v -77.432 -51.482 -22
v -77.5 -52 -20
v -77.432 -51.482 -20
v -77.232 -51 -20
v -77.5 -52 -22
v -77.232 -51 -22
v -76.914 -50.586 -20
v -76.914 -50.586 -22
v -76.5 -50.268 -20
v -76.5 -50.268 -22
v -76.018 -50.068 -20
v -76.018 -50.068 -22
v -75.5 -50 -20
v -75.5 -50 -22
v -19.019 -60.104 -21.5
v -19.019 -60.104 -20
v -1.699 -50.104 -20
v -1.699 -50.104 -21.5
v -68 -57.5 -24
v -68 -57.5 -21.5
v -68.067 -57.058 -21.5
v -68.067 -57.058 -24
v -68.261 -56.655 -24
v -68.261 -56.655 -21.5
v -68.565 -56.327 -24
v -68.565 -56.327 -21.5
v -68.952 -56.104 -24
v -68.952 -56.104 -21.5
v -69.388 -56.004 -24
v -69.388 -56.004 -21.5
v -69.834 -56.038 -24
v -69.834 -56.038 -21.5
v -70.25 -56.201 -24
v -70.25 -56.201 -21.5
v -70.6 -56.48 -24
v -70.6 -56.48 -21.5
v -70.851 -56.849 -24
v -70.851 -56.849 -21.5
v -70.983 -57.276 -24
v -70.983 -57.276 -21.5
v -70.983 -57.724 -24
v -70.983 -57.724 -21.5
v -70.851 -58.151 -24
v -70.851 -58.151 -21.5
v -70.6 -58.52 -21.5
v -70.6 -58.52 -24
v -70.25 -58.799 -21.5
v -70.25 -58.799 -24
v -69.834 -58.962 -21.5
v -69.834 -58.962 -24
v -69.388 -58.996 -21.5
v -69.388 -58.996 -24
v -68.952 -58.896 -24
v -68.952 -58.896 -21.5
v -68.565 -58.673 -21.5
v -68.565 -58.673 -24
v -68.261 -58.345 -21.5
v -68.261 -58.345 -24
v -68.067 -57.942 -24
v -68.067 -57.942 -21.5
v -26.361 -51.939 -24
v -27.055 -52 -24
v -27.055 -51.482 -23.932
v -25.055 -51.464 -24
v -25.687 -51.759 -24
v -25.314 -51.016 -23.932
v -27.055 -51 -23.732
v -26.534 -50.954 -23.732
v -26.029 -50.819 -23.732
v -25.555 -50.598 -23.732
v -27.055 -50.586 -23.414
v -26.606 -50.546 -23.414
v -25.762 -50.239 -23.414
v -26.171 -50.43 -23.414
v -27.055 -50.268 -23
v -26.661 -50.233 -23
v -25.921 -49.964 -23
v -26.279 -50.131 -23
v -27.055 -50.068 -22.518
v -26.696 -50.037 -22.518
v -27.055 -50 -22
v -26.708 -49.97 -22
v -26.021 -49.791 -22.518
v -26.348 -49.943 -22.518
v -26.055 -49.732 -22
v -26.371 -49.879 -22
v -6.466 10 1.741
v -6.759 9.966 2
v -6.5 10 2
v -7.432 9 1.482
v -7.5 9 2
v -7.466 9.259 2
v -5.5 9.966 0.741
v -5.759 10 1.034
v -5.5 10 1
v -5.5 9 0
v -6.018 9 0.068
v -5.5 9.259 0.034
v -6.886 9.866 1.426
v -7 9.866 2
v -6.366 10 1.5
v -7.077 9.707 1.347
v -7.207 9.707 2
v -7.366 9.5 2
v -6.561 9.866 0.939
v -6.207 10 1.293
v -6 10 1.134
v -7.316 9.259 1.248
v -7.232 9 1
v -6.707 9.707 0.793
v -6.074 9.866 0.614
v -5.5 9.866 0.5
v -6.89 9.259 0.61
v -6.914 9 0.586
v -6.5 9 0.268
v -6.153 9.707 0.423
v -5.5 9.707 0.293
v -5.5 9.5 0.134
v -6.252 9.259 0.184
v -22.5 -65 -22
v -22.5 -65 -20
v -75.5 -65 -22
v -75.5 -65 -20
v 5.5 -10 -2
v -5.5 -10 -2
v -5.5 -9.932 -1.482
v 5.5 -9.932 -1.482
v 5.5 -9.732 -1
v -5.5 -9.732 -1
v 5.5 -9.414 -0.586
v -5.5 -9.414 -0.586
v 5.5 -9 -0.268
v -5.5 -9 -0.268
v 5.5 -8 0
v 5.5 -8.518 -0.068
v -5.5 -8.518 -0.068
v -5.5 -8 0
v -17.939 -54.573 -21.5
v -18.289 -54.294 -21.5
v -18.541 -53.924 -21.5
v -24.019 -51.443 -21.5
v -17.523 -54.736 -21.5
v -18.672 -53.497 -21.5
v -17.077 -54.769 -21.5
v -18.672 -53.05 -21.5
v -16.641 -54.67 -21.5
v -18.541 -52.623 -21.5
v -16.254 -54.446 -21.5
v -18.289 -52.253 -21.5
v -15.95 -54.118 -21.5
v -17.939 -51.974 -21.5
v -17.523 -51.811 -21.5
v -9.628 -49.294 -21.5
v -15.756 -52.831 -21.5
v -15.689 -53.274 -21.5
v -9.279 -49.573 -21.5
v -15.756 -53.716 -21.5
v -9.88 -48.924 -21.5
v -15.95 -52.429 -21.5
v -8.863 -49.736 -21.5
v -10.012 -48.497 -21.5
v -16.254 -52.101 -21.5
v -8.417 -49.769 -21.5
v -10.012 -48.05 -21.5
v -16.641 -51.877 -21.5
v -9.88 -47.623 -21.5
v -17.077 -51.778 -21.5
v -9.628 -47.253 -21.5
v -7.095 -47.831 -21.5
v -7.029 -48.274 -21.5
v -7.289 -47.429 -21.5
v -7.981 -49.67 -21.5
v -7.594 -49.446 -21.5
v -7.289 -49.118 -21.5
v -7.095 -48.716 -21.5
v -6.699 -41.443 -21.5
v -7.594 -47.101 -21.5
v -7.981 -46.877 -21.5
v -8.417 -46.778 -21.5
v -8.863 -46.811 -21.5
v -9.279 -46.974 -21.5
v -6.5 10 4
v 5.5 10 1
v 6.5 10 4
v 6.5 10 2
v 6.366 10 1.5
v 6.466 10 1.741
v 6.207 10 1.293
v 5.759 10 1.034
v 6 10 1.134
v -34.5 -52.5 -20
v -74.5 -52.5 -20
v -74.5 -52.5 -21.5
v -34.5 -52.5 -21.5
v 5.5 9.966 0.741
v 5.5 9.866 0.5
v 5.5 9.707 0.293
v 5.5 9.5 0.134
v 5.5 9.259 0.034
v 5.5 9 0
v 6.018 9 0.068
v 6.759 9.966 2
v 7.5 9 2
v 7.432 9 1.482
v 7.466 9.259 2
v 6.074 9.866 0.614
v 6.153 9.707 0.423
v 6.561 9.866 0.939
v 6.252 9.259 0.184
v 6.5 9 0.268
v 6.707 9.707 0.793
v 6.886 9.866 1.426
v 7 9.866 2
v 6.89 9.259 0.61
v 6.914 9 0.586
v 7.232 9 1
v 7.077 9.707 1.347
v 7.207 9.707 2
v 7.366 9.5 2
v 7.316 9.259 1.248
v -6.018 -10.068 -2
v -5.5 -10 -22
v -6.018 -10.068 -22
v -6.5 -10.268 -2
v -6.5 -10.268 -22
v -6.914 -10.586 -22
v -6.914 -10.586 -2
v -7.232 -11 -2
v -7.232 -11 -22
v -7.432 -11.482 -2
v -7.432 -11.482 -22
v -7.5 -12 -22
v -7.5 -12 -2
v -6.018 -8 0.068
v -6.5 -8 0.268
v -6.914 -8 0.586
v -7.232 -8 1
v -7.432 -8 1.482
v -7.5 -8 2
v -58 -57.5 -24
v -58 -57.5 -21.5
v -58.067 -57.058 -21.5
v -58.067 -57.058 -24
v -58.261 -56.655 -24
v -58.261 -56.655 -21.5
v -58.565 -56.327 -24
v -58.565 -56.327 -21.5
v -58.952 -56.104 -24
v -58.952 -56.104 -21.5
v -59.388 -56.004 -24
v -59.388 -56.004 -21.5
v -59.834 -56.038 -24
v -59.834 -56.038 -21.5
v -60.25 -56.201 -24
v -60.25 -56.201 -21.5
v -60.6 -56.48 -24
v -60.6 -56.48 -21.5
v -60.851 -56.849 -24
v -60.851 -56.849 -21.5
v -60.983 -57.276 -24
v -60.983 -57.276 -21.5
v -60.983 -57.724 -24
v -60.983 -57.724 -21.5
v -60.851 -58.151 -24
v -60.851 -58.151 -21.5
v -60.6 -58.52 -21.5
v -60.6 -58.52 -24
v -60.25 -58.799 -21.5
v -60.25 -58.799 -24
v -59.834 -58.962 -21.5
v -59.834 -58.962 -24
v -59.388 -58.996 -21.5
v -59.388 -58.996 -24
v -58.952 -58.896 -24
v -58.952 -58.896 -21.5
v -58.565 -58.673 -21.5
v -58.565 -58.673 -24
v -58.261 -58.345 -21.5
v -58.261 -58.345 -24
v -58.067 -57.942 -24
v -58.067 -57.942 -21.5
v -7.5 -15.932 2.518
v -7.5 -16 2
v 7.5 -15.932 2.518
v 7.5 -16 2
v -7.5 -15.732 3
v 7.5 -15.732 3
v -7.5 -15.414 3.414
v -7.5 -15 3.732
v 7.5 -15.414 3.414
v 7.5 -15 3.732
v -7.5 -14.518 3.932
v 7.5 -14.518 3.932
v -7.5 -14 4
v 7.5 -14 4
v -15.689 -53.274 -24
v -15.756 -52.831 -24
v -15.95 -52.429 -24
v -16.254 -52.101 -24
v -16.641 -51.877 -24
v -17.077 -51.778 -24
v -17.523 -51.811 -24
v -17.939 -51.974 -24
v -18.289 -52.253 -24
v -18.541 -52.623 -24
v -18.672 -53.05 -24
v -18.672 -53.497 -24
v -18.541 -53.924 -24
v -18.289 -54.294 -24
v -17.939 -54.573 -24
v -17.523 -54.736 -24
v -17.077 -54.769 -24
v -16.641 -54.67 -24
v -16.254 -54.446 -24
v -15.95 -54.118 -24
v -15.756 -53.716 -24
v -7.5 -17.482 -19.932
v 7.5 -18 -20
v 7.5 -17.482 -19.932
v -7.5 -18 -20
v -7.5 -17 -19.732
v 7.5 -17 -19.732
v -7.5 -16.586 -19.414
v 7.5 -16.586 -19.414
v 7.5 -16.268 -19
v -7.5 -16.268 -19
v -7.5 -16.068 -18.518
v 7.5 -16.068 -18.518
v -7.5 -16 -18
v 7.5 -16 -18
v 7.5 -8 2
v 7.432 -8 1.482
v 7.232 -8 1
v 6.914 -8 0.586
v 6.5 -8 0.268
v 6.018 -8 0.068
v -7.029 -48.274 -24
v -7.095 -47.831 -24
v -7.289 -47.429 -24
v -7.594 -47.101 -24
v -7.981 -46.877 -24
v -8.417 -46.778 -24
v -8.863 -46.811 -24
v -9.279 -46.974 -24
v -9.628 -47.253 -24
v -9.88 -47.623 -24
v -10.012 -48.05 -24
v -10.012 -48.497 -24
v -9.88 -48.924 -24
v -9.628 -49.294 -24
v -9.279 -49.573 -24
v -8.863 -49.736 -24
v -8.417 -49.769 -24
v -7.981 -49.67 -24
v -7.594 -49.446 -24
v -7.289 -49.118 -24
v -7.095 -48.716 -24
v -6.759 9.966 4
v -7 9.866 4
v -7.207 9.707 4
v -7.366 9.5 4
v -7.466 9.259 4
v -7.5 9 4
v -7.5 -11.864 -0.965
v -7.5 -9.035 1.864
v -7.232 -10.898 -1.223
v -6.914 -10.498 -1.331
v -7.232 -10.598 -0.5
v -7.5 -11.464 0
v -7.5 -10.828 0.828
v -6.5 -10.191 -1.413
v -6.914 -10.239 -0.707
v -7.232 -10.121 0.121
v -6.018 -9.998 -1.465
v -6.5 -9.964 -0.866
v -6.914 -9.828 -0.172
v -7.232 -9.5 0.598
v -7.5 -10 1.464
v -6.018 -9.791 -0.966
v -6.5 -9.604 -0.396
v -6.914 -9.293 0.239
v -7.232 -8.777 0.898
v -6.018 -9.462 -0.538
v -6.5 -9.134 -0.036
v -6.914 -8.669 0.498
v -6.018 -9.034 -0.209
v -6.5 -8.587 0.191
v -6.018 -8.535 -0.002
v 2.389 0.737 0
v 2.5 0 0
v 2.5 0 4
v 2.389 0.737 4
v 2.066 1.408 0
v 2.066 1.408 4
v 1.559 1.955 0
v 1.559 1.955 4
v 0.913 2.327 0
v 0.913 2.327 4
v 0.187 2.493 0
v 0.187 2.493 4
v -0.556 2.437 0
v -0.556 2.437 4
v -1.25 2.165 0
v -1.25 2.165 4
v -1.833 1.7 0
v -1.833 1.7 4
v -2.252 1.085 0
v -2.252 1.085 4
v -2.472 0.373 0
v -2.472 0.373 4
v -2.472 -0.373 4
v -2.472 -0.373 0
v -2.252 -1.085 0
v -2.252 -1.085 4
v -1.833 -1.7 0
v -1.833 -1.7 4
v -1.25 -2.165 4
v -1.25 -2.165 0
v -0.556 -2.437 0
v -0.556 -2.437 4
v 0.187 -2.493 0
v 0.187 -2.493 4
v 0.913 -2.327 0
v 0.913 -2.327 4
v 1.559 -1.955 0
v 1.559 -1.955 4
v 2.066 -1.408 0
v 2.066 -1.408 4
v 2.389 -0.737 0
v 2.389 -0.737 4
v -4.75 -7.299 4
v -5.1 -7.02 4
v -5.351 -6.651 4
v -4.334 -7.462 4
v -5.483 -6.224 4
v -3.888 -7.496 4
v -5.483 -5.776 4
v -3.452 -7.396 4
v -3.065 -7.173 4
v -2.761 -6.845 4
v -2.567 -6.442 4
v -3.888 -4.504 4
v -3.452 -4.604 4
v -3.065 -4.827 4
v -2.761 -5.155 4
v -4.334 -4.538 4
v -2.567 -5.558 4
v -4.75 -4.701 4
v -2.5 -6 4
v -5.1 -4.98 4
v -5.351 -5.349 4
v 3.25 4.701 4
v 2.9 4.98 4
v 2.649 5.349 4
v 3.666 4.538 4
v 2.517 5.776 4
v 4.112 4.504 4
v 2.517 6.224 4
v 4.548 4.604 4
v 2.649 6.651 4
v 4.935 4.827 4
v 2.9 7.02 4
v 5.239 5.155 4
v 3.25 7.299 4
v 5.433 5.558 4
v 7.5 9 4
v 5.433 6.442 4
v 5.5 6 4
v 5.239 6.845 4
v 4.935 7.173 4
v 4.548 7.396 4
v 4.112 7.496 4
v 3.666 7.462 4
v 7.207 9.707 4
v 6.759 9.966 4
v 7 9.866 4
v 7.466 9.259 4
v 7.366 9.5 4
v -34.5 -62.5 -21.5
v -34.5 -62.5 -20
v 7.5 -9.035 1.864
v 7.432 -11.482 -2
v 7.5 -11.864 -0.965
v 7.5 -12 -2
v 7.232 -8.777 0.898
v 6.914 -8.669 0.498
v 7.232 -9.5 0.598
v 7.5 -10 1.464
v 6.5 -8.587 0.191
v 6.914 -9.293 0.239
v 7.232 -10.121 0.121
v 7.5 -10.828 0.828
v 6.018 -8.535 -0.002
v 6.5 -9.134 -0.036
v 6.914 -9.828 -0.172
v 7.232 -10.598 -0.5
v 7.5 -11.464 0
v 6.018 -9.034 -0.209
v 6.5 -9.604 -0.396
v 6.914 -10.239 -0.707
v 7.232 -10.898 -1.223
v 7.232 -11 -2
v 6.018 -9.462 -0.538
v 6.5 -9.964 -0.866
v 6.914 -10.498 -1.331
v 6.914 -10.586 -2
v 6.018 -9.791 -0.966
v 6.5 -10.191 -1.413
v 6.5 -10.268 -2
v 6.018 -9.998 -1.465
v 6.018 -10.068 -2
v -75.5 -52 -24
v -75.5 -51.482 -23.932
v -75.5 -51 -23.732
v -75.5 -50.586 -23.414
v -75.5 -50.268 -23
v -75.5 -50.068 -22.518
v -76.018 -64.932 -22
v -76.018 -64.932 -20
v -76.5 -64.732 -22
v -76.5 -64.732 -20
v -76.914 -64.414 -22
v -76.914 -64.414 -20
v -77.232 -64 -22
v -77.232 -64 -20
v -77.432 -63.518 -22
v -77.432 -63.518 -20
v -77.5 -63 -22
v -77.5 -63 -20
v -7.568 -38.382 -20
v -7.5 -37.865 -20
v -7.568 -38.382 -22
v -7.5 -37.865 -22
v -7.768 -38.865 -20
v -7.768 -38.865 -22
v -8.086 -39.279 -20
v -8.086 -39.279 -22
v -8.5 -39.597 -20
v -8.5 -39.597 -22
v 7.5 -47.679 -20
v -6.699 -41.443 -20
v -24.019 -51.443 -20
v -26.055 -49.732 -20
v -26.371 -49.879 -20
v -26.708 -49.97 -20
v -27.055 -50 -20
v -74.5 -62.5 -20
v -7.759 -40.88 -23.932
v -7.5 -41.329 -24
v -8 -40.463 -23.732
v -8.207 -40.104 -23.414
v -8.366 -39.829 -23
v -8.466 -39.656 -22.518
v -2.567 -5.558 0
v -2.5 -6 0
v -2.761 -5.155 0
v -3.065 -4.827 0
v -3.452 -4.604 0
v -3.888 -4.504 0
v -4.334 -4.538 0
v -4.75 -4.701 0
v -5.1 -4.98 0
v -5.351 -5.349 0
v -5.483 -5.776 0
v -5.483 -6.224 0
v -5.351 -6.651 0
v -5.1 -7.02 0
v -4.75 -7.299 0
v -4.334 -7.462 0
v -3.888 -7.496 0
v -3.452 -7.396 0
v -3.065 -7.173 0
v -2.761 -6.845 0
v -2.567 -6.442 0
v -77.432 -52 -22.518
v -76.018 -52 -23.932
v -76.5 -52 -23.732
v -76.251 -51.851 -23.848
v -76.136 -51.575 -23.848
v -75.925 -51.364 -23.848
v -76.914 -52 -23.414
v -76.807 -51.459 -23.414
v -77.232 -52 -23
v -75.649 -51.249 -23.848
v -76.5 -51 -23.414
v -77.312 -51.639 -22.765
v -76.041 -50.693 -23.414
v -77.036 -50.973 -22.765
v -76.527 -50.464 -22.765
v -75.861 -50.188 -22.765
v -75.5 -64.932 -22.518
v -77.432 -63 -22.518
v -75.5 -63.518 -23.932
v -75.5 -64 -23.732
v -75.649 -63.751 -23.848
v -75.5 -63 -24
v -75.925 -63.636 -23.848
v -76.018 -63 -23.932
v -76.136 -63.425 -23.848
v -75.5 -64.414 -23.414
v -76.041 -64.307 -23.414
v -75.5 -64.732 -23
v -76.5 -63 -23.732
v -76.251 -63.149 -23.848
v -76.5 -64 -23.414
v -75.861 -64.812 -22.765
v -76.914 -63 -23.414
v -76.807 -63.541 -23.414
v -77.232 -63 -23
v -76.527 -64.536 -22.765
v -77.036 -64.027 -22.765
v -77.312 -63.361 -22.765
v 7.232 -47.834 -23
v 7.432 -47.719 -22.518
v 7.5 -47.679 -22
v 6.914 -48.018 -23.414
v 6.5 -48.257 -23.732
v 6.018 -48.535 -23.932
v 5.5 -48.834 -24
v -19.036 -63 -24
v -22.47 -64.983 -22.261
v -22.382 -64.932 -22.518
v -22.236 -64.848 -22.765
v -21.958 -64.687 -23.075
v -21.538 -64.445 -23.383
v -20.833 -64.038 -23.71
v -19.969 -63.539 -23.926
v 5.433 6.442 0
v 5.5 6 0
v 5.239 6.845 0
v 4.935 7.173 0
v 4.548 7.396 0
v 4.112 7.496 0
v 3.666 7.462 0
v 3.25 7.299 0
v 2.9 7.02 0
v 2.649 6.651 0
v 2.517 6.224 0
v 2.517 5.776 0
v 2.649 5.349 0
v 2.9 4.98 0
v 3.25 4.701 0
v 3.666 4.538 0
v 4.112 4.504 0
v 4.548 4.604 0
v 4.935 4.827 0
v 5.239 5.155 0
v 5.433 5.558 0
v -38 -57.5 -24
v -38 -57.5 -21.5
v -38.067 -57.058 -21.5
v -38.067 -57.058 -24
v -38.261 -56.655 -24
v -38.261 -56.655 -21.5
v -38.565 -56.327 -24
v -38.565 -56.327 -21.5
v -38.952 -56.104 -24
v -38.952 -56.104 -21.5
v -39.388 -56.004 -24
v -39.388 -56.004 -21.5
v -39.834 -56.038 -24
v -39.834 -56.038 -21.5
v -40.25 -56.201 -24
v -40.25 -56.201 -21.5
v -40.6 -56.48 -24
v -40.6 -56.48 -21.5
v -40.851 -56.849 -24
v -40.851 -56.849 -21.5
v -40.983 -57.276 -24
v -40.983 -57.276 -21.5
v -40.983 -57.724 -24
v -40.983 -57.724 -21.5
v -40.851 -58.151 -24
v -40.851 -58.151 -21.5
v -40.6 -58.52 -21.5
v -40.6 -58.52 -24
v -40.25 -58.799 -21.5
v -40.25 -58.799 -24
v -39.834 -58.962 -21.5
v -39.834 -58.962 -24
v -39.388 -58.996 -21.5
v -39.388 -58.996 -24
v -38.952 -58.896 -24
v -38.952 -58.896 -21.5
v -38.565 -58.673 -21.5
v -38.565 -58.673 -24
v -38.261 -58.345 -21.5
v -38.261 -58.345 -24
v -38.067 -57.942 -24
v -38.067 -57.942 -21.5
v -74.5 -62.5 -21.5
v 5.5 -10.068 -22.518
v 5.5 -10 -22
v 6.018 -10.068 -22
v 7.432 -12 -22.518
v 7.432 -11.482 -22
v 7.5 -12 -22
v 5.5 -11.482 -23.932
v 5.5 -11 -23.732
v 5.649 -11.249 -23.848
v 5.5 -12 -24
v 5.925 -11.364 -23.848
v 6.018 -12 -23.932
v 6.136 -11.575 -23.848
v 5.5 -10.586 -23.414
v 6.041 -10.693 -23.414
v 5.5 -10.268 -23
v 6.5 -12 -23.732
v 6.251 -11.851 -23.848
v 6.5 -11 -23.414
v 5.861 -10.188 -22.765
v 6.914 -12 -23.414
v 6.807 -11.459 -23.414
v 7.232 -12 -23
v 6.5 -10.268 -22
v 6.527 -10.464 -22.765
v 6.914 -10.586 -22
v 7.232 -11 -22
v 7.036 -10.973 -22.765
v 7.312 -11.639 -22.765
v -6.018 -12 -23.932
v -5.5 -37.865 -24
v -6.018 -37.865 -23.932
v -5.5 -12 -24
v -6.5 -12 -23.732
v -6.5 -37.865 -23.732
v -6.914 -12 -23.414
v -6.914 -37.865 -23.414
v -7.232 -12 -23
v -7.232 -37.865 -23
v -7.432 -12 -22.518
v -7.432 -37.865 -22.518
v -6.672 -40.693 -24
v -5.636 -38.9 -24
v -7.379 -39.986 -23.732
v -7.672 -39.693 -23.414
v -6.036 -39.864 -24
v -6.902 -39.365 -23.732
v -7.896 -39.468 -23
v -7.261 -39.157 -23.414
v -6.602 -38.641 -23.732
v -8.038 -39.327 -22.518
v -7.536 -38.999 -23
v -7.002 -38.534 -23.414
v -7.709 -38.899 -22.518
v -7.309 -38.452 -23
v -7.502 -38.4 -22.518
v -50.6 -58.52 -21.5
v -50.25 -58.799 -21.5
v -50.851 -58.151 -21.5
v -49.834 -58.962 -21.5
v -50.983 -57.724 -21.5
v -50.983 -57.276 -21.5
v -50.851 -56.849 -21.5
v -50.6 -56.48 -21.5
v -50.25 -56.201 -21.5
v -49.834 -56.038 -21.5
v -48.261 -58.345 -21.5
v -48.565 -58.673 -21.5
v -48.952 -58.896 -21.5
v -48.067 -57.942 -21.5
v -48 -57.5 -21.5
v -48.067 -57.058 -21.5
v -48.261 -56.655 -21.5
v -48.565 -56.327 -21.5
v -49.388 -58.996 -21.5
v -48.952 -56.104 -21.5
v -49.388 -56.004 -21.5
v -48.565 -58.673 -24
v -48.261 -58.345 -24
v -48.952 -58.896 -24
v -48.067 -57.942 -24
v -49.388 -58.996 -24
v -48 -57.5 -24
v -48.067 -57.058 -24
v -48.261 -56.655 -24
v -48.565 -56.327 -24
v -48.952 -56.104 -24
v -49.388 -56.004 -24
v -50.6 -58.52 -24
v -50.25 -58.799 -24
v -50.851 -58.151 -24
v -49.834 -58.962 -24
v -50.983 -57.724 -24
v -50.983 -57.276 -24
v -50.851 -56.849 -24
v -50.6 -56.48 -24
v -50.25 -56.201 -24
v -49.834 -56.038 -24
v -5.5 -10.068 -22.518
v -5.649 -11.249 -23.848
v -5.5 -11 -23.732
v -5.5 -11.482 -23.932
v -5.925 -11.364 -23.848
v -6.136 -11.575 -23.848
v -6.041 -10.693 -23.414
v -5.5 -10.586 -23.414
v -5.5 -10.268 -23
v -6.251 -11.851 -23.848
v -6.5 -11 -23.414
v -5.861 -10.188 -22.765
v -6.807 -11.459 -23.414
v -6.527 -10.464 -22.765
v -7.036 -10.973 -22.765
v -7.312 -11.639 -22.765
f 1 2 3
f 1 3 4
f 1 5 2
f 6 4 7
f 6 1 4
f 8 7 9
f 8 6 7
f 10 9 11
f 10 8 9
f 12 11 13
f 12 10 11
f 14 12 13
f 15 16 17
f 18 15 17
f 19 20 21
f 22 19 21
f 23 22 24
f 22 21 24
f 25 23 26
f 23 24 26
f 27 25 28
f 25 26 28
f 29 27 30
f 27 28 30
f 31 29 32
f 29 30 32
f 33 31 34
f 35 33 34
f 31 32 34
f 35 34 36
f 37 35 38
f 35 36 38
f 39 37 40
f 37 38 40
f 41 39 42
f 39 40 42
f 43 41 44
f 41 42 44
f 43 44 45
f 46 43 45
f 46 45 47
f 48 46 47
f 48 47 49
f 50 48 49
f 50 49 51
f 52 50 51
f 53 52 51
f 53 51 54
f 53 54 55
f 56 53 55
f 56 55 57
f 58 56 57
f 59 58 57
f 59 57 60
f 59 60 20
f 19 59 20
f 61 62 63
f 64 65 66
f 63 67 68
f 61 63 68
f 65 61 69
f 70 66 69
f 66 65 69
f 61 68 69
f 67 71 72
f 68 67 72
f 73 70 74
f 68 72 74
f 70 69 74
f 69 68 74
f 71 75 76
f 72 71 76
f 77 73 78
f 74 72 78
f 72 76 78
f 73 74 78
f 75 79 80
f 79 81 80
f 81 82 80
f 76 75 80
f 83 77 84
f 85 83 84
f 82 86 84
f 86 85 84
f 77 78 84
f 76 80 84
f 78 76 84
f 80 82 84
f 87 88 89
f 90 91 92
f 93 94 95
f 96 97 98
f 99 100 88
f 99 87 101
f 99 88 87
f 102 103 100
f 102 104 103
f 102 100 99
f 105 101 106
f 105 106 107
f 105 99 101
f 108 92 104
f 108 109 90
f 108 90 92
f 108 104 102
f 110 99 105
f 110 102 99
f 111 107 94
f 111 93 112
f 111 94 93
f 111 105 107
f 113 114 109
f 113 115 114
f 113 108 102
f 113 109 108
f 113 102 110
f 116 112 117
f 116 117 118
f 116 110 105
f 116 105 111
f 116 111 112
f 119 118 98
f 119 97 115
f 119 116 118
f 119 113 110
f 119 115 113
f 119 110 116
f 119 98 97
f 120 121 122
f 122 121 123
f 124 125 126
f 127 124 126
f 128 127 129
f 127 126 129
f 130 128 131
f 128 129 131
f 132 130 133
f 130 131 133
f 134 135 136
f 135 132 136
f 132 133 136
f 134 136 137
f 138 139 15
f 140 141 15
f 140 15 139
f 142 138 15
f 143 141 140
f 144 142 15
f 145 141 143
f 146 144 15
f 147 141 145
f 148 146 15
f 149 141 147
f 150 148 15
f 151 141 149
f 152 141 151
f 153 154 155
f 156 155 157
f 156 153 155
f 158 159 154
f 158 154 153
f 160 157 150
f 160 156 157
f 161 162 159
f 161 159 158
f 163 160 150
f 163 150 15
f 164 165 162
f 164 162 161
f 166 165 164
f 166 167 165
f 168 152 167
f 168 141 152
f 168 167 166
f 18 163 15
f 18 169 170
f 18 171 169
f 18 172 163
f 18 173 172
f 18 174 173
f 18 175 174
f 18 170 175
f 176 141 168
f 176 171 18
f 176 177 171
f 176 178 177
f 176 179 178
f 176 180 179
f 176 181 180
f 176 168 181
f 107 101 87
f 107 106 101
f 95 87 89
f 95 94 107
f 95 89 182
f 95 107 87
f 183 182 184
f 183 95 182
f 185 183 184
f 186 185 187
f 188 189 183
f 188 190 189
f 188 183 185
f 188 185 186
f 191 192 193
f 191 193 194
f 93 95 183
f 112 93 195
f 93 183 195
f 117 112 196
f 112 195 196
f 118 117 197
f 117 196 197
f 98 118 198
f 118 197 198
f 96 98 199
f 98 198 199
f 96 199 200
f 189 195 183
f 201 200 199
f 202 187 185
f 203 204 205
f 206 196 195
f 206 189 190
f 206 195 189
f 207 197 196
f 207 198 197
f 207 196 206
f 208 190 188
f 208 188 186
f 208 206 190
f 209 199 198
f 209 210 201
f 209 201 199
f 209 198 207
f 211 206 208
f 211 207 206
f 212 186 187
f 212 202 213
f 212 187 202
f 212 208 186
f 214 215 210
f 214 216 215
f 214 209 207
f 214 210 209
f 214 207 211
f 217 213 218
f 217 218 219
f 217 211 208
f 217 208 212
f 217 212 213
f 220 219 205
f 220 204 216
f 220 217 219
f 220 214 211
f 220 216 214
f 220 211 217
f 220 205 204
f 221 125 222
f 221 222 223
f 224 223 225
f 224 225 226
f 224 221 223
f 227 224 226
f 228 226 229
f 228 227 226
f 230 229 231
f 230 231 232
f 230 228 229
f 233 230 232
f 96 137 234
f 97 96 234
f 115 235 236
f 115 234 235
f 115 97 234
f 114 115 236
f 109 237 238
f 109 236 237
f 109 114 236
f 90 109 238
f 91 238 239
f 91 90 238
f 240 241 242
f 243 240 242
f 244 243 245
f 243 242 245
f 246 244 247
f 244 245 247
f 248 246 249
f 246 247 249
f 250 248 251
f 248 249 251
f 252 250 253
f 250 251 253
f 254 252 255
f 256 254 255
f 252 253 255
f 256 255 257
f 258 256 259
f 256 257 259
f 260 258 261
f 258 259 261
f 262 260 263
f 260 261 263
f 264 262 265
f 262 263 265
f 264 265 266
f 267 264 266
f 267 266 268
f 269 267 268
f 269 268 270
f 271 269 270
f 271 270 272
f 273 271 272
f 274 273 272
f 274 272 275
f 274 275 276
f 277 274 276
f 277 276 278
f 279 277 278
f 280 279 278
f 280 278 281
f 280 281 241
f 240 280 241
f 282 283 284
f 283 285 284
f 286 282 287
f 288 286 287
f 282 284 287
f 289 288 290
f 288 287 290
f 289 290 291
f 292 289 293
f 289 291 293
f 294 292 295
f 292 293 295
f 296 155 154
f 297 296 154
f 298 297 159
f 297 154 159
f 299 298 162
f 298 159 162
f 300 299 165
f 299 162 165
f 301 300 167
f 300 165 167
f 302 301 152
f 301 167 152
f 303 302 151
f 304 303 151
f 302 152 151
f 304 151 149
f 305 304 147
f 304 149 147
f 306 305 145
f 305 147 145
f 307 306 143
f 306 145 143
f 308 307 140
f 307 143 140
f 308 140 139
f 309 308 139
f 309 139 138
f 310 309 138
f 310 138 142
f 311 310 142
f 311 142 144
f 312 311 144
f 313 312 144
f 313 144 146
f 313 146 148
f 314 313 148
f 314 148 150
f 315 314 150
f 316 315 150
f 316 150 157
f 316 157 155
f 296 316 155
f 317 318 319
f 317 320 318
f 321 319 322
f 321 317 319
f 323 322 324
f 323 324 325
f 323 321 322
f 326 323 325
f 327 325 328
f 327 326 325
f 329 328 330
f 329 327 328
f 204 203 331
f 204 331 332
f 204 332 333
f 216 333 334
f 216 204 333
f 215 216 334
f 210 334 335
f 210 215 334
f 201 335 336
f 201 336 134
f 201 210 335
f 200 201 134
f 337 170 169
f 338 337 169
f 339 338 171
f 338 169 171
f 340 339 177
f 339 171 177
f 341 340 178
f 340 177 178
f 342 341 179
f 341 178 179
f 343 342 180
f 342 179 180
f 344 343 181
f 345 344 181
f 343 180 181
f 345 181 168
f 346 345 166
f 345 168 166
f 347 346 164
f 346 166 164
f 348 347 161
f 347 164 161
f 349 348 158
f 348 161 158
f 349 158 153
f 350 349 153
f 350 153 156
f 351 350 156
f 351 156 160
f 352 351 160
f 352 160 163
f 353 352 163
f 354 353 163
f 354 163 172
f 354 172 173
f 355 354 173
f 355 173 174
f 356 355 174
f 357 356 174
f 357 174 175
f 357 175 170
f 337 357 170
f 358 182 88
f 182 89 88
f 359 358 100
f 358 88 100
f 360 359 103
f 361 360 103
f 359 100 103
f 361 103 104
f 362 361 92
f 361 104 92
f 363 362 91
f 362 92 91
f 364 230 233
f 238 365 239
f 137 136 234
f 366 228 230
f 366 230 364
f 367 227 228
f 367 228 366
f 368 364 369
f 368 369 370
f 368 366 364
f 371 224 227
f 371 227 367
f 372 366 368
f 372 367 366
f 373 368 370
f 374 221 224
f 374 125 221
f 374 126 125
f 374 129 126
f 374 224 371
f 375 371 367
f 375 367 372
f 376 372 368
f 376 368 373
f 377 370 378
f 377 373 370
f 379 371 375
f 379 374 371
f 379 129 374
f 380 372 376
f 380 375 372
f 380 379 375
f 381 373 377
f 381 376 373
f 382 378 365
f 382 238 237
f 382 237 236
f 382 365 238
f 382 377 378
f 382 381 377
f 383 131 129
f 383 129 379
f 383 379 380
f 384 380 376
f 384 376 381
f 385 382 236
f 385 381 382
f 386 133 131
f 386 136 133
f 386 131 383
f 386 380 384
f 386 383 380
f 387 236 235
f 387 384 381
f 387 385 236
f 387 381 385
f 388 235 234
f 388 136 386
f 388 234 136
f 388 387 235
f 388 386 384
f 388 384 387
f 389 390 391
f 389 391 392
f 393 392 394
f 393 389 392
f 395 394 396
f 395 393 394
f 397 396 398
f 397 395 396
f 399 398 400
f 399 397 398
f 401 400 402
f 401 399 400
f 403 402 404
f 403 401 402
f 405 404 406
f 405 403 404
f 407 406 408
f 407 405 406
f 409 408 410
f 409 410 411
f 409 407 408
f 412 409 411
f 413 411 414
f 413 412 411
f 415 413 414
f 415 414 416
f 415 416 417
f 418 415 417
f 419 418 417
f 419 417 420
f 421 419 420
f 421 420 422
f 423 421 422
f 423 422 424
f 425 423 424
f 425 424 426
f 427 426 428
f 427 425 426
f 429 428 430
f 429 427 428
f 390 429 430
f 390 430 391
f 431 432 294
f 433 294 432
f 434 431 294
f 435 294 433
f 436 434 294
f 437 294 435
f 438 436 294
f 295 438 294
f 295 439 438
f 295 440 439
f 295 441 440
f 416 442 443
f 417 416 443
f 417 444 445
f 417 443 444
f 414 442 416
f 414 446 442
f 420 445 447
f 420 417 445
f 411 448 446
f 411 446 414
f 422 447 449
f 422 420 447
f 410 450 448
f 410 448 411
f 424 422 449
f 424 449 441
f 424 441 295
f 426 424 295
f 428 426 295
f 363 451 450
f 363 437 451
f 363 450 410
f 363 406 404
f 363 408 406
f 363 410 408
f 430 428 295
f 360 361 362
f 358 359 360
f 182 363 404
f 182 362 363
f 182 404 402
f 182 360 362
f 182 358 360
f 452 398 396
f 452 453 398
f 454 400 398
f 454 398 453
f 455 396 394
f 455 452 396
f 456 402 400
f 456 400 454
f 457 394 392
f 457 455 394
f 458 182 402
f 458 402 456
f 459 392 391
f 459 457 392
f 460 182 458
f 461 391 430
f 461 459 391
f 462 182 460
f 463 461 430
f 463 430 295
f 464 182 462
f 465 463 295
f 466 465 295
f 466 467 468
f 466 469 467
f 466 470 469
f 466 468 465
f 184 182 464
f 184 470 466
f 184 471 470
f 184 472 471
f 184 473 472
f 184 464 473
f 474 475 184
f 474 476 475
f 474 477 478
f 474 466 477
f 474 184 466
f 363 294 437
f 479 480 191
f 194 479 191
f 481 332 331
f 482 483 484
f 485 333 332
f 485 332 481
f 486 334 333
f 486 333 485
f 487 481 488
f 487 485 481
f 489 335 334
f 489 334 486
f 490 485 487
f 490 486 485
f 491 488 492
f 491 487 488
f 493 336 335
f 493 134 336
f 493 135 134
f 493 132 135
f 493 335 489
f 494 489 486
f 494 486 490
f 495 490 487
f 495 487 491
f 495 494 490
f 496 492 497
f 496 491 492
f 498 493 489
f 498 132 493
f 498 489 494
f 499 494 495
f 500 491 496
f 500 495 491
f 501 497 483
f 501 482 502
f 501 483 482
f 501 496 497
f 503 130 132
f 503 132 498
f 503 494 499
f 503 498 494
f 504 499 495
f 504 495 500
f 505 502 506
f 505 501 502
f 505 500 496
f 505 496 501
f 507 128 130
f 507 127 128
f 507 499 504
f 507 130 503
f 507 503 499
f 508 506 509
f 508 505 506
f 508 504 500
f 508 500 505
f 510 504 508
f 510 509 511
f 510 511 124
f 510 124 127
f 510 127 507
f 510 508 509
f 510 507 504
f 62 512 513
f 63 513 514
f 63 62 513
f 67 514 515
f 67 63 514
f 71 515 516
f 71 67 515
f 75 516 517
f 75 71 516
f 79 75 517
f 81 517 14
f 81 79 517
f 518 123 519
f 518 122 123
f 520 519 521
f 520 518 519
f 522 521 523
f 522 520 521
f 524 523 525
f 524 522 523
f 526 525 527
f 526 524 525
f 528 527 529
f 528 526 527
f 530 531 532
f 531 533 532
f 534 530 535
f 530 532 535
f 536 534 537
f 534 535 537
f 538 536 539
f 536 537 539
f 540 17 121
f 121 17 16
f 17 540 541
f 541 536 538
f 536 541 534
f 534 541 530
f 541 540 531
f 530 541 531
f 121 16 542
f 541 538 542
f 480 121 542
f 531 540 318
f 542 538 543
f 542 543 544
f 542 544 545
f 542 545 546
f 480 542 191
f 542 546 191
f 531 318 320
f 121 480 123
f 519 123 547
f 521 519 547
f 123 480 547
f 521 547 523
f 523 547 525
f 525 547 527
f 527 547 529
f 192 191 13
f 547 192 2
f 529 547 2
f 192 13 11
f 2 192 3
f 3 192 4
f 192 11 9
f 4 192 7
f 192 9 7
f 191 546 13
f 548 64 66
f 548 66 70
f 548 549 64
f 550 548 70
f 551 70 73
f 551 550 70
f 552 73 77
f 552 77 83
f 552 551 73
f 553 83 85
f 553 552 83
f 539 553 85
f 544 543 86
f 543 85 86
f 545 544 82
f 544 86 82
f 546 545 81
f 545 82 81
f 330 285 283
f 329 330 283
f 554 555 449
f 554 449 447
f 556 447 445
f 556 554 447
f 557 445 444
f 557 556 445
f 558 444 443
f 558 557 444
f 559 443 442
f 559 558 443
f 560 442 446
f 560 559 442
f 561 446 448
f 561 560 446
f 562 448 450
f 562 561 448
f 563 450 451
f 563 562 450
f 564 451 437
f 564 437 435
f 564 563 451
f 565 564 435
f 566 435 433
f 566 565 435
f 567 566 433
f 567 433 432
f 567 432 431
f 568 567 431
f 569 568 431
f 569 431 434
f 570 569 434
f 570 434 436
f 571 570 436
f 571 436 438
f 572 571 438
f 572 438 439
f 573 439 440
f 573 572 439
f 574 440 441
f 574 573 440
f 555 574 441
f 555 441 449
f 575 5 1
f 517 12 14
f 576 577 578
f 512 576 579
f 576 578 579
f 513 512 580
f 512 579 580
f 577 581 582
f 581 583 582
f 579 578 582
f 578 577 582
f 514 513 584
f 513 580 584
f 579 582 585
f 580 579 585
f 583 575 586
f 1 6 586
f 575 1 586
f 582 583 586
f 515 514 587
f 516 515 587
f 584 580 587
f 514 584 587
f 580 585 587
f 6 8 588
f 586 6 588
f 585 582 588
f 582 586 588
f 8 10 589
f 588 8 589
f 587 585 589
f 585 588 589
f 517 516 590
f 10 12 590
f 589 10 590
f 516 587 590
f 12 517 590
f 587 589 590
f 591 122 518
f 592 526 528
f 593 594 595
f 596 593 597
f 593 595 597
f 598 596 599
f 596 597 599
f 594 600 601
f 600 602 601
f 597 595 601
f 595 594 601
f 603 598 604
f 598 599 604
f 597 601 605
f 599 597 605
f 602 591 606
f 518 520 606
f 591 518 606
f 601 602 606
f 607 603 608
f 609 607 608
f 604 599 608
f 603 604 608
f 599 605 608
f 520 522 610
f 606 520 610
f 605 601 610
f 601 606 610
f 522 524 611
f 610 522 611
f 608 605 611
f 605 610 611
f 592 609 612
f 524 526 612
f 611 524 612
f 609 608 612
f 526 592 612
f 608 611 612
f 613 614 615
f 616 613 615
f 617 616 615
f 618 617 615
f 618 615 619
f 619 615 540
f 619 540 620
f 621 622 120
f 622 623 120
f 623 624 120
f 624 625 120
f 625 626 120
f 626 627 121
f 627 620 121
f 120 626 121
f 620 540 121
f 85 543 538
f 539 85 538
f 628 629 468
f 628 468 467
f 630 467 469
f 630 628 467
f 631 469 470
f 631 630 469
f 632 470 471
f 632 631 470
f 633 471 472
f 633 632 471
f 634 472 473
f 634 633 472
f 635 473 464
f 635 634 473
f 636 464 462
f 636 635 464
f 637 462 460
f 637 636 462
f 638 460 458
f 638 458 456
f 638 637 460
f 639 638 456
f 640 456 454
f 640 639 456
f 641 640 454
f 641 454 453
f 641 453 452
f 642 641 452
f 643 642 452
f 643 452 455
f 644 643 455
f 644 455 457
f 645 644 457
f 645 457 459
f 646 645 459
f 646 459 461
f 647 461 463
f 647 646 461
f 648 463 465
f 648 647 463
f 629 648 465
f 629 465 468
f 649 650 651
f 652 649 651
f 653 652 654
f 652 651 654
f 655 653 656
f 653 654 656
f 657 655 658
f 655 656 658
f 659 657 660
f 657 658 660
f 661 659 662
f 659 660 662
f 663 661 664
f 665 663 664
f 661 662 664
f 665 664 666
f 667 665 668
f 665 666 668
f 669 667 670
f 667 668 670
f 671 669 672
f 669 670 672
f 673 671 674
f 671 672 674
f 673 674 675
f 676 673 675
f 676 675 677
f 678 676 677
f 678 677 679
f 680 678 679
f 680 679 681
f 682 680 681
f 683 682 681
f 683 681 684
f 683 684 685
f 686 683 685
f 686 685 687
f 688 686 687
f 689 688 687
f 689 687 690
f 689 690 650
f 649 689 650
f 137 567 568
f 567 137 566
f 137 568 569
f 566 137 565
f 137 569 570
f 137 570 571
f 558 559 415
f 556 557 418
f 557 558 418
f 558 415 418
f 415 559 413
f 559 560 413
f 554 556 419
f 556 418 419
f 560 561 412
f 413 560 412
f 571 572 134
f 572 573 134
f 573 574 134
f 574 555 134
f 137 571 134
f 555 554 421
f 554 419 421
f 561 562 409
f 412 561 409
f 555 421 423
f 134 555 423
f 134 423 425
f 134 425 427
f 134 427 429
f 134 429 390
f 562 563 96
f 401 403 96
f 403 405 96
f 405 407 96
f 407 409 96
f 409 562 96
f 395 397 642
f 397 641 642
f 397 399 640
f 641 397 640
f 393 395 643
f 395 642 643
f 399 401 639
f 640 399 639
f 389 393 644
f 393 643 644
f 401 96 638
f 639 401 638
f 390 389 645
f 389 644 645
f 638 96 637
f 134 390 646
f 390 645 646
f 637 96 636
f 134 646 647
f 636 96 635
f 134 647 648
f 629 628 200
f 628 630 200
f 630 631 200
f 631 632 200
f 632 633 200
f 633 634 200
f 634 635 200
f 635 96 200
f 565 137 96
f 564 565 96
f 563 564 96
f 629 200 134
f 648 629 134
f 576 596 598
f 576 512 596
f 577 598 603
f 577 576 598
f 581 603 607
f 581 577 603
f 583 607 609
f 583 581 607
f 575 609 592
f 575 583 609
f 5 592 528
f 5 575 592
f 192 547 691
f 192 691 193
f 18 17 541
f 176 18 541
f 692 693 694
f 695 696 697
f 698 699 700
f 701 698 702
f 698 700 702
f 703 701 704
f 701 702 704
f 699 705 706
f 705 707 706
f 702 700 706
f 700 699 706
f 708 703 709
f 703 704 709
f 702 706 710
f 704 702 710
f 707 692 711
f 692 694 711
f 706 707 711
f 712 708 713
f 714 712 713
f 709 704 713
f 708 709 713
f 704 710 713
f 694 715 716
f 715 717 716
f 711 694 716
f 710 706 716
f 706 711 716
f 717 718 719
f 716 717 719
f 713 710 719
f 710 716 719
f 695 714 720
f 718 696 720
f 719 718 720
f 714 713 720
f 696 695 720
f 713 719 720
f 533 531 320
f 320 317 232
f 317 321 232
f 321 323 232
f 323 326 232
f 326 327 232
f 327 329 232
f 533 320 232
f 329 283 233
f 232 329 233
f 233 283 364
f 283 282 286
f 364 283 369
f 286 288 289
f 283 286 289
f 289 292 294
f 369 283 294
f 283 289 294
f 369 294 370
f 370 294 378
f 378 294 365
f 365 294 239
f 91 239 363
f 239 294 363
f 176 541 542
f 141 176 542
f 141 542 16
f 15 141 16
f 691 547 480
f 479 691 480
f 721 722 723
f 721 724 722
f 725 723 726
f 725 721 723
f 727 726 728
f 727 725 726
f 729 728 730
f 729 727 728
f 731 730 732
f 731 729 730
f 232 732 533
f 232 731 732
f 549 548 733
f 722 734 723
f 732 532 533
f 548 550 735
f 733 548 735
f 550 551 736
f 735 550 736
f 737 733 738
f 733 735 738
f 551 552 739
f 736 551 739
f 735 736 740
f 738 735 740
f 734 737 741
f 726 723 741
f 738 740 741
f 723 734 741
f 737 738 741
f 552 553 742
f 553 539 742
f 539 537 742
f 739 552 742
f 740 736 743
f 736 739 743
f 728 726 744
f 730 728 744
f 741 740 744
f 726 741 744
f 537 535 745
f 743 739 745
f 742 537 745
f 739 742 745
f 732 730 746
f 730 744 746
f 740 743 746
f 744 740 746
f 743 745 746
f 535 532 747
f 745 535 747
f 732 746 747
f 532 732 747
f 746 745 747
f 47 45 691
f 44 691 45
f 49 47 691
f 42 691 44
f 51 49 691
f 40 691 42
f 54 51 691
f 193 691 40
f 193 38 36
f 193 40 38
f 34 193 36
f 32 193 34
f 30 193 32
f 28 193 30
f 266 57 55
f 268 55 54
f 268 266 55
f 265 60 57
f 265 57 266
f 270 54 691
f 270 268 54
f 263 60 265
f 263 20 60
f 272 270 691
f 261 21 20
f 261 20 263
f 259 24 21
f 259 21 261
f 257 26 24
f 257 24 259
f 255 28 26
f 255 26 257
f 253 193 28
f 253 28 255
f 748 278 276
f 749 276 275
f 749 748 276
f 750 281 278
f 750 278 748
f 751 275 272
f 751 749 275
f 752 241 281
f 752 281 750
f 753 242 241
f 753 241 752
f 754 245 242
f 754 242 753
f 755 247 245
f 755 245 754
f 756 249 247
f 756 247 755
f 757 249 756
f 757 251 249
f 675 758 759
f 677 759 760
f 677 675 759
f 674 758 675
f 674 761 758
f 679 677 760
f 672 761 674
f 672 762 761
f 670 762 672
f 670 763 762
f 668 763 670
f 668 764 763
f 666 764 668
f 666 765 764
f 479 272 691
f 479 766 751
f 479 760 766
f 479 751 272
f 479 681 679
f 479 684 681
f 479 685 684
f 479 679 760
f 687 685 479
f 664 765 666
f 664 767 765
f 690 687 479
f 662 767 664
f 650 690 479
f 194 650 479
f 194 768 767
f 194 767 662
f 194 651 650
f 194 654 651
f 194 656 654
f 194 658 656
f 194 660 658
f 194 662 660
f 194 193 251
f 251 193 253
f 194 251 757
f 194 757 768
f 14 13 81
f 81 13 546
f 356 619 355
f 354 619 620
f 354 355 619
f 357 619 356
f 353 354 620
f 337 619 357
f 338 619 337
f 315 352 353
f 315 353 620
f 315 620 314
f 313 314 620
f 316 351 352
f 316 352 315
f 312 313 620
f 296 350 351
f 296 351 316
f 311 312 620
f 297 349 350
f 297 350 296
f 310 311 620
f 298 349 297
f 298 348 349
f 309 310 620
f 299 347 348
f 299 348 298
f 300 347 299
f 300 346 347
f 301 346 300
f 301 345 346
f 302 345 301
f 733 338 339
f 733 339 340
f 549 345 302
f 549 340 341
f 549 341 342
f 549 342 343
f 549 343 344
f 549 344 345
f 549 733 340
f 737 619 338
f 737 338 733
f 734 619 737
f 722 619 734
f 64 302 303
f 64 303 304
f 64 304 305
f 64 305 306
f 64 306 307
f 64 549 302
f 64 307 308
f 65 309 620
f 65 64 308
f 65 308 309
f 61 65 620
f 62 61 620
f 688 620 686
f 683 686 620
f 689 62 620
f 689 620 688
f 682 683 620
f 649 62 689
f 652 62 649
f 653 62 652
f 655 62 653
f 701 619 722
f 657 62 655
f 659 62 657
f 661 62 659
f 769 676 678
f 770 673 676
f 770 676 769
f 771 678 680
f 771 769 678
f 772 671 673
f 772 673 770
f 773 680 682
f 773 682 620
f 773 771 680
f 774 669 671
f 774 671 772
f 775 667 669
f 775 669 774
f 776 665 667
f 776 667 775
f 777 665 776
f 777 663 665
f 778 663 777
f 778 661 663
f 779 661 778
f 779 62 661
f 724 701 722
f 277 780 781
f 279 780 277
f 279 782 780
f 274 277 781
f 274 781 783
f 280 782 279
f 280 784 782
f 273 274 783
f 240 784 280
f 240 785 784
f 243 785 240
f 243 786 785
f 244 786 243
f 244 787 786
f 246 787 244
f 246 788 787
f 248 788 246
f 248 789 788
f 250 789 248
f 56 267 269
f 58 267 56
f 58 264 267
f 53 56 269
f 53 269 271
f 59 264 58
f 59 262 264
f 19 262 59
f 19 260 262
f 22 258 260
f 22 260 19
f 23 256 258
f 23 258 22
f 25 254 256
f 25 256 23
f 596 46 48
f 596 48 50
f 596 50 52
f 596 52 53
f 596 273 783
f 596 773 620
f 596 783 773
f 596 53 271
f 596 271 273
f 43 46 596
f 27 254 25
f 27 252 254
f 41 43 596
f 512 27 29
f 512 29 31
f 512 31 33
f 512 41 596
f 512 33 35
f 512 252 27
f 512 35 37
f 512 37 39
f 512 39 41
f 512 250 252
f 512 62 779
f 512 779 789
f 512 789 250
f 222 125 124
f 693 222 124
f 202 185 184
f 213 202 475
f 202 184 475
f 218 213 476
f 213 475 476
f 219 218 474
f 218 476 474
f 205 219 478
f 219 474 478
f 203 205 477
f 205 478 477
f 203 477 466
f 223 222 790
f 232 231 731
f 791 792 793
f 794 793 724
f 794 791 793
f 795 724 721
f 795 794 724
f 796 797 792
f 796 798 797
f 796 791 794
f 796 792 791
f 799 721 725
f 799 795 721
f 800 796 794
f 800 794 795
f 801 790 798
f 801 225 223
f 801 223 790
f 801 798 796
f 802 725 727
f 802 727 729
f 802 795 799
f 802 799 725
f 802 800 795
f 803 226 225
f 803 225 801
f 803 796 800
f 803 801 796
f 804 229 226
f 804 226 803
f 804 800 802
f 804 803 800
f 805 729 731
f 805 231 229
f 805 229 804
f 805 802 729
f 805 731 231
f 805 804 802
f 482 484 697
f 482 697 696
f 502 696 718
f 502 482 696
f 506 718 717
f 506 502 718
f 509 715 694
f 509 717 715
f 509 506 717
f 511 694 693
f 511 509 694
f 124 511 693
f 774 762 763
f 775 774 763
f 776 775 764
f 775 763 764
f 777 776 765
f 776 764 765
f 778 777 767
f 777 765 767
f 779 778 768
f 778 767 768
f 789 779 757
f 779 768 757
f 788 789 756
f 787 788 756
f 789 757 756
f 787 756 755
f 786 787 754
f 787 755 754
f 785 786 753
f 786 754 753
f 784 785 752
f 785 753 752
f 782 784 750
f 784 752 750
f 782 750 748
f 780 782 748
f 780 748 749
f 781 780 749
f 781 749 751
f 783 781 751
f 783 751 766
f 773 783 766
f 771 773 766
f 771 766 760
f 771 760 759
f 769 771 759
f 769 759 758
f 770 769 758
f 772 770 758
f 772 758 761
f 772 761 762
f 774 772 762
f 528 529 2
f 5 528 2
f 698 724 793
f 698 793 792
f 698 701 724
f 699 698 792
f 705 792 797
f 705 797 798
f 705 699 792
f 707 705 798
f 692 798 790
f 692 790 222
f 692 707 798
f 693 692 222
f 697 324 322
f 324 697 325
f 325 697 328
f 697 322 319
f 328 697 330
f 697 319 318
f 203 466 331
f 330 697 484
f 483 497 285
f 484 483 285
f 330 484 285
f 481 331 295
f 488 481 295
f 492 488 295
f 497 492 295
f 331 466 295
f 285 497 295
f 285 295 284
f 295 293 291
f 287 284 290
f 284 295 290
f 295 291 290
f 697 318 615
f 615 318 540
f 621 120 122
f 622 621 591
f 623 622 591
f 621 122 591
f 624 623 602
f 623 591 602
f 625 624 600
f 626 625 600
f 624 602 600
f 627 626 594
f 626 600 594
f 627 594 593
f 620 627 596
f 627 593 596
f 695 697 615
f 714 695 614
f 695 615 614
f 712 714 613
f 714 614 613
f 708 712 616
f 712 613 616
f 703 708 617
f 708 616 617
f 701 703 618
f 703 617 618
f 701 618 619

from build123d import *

# Parameters (mm, degrees)
SKETCH_1_W          = 15
SKETCH_1_H          = 26
SKETCH_1_R          = 2.5
SKETCH_1_R_2        = 1.5
EXTRUDE_1_DEPTH     = 4
SKETCH_3_W          = 15
SKETCH_3_H          = 6
EXTRUDE_2_DEPTH     = 20
EXTRUDE_3_DEPTH     = 4
SKETCH_9_W          = 40
SKETCH_9_H          = 10
CUT_EXTRUDE_1_DEPTH = 1.5
SKETCH_10_R         = 1.5
CUT_EXTRUDE_2_DEPTH = 4
CUT_EXTRUDE_3_DEPTH = 1.5
SKETCH_12_R         = 1.5
CUT_EXTRUDE_4_DEPTH = 10
FILLET_1_R          = 2
FILLET_2_R          = 2
FILLET_3_R          = 1


with BuildPart() as part:
    # 草图1 → 凸台-拉伸1 (new body)
    with BuildSketch(Plane.XY):
        with Locations((0, -3)):
            Rectangle(SKETCH_1_W, SKETCH_1_H)
        Circle(SKETCH_1_R, mode=Mode.SUBTRACT)
        with Locations((4, 6)):
            Circle(SKETCH_1_R_2, mode=Mode.SUBTRACT)
        with Locations((-4, -6)):
            Circle(SKETCH_1_R_2, mode=Mode.SUBTRACT)
    extrude(amount=EXTRUDE_1_DEPTH)

    # 草图3 → 凸台-拉伸2 (add)
    with BuildSketch(Plane(origin=(0, 0, 0), x_dir=(-1, 0, 0), z_dir=(0, 0, -1))):
        with Locations((0, -13)):
            Rectangle(SKETCH_3_W, SKETCH_3_H)
    extrude(amount=EXTRUDE_2_DEPTH)

    # 草图8 → 凸台-拉伸3 (add)
    with BuildSketch(Plane(origin=(0, 0, -20), x_dir=(-1, 0, 0), z_dir=(0, 0, -1))):
        Polygon((-7.5, -16), (-7.5, -47.679491924), (22.5, -65), (77.5, -65), (77.5, -50), (26.519237886, -50), (7.5, -39.019237886), (7.5, -16), (7.5, -10), (-7.5, -10), align=None)
    extrude(amount=EXTRUDE_3_DEPTH)

    # 草图9 → 切除-拉伸1 (cut)
    with BuildSketch(Plane.XY.offset(-20)):
        with Locations((-54.5, -57.5)):
            Rectangle(SKETCH_9_W, SKETCH_9_H)
    extrude(amount=-CUT_EXTRUDE_1_DEPTH, mode=Mode.SUBTRACT)

    # 草图10 → 切除-拉伸2 (cut)
    with BuildSketch(Plane.XY.offset(-21.5)):
        with Locations((-69.5, -57.5)):
            Circle(SKETCH_10_R)
        with Locations((-59.5, -57.5)):
            Circle(SKETCH_10_R)
        with Locations((-49.5, -57.5)):
            Circle(SKETCH_10_R)
        with Locations((-39.5, -57.5)):
            Circle(SKETCH_10_R)
    extrude(amount=-CUT_EXTRUDE_2_DEPTH, mode=Mode.SUBTRACT)

    # 草图11 → 切除-拉伸3 (cut)
    with BuildSketch(Plane.XY.offset(-20)):
        Polygon((-6.698729811, -41.443375673), (-24.019237886, -51.443375673), (-19.019237886, -60.103629711), (-1.698729811, -50.103629711), align=None)
    extrude(amount=-CUT_EXTRUDE_3_DEPTH, mode=Mode.SUBTRACT)

    # 草图12 → 切除-拉伸4 (cut)
    with BuildSketch(Plane.XY.offset(-21.5)):
        with Locations((-17.189110868, -53.273502692)):
            Circle(SKETCH_12_R)
        with Locations((-8.52885683, -48.273502692)):
            Circle(SKETCH_12_R)
    extrude(amount=-CUT_EXTRUDE_4_DEPTH, mode=Mode.SUBTRACT)

    # 圆角1
    fillet_1_edges = [part.edges().sort_by_distance(p)[0] for p in [
        (7.5, 0, 0),
        (7.5, -10, -12),
        (0, -10, 0),
        (-7.5, -10, -12),
        (0, -16, -20),
        (-77.5, -65, -22),
        (-77.5, -50, -22),
        (-26.519237886, -50, -22),
        (-7.5, -39.019237886, -22),
        (0, -10, -24),
        (7.5, -28.839745962, -24),
        (-50, -65, -24),
        (-77.5, -57.5, -24),
        (-52.009618943, -50, -24),
        (-17.009618943, -44.509618943, -24),
        (-7.5, -24.509618943, -24),
        (-7.5, 0, 0),
    ]]
    fillet(fillet_1_edges, radius=FILLET_1_R - 0.0001)  # a hair under: the kernel refuses the full size

    # 圆角2
    fillet_2_edges = [part.edges().sort_by_distance(p)[0] for p in [
        (0, -16, 4),
    ]]
    fillet(fillet_2_edges, radius=FILLET_2_R)

    # 圆角3
    fillet_3_edges = [part.edges().sort_by_distance(p)[0] for p in [
        (0, 10, 0),
        (-6.914242852, 10, 0.585757148),
        (6.914242852, 10, 0.585757148),
        (-7.5, 10, 2.99995),
        (7.5, 10, 2.99995),
    ]]
    fillet(fillet_3_edges, radius=FILLET_3_R)


solid = part.part
